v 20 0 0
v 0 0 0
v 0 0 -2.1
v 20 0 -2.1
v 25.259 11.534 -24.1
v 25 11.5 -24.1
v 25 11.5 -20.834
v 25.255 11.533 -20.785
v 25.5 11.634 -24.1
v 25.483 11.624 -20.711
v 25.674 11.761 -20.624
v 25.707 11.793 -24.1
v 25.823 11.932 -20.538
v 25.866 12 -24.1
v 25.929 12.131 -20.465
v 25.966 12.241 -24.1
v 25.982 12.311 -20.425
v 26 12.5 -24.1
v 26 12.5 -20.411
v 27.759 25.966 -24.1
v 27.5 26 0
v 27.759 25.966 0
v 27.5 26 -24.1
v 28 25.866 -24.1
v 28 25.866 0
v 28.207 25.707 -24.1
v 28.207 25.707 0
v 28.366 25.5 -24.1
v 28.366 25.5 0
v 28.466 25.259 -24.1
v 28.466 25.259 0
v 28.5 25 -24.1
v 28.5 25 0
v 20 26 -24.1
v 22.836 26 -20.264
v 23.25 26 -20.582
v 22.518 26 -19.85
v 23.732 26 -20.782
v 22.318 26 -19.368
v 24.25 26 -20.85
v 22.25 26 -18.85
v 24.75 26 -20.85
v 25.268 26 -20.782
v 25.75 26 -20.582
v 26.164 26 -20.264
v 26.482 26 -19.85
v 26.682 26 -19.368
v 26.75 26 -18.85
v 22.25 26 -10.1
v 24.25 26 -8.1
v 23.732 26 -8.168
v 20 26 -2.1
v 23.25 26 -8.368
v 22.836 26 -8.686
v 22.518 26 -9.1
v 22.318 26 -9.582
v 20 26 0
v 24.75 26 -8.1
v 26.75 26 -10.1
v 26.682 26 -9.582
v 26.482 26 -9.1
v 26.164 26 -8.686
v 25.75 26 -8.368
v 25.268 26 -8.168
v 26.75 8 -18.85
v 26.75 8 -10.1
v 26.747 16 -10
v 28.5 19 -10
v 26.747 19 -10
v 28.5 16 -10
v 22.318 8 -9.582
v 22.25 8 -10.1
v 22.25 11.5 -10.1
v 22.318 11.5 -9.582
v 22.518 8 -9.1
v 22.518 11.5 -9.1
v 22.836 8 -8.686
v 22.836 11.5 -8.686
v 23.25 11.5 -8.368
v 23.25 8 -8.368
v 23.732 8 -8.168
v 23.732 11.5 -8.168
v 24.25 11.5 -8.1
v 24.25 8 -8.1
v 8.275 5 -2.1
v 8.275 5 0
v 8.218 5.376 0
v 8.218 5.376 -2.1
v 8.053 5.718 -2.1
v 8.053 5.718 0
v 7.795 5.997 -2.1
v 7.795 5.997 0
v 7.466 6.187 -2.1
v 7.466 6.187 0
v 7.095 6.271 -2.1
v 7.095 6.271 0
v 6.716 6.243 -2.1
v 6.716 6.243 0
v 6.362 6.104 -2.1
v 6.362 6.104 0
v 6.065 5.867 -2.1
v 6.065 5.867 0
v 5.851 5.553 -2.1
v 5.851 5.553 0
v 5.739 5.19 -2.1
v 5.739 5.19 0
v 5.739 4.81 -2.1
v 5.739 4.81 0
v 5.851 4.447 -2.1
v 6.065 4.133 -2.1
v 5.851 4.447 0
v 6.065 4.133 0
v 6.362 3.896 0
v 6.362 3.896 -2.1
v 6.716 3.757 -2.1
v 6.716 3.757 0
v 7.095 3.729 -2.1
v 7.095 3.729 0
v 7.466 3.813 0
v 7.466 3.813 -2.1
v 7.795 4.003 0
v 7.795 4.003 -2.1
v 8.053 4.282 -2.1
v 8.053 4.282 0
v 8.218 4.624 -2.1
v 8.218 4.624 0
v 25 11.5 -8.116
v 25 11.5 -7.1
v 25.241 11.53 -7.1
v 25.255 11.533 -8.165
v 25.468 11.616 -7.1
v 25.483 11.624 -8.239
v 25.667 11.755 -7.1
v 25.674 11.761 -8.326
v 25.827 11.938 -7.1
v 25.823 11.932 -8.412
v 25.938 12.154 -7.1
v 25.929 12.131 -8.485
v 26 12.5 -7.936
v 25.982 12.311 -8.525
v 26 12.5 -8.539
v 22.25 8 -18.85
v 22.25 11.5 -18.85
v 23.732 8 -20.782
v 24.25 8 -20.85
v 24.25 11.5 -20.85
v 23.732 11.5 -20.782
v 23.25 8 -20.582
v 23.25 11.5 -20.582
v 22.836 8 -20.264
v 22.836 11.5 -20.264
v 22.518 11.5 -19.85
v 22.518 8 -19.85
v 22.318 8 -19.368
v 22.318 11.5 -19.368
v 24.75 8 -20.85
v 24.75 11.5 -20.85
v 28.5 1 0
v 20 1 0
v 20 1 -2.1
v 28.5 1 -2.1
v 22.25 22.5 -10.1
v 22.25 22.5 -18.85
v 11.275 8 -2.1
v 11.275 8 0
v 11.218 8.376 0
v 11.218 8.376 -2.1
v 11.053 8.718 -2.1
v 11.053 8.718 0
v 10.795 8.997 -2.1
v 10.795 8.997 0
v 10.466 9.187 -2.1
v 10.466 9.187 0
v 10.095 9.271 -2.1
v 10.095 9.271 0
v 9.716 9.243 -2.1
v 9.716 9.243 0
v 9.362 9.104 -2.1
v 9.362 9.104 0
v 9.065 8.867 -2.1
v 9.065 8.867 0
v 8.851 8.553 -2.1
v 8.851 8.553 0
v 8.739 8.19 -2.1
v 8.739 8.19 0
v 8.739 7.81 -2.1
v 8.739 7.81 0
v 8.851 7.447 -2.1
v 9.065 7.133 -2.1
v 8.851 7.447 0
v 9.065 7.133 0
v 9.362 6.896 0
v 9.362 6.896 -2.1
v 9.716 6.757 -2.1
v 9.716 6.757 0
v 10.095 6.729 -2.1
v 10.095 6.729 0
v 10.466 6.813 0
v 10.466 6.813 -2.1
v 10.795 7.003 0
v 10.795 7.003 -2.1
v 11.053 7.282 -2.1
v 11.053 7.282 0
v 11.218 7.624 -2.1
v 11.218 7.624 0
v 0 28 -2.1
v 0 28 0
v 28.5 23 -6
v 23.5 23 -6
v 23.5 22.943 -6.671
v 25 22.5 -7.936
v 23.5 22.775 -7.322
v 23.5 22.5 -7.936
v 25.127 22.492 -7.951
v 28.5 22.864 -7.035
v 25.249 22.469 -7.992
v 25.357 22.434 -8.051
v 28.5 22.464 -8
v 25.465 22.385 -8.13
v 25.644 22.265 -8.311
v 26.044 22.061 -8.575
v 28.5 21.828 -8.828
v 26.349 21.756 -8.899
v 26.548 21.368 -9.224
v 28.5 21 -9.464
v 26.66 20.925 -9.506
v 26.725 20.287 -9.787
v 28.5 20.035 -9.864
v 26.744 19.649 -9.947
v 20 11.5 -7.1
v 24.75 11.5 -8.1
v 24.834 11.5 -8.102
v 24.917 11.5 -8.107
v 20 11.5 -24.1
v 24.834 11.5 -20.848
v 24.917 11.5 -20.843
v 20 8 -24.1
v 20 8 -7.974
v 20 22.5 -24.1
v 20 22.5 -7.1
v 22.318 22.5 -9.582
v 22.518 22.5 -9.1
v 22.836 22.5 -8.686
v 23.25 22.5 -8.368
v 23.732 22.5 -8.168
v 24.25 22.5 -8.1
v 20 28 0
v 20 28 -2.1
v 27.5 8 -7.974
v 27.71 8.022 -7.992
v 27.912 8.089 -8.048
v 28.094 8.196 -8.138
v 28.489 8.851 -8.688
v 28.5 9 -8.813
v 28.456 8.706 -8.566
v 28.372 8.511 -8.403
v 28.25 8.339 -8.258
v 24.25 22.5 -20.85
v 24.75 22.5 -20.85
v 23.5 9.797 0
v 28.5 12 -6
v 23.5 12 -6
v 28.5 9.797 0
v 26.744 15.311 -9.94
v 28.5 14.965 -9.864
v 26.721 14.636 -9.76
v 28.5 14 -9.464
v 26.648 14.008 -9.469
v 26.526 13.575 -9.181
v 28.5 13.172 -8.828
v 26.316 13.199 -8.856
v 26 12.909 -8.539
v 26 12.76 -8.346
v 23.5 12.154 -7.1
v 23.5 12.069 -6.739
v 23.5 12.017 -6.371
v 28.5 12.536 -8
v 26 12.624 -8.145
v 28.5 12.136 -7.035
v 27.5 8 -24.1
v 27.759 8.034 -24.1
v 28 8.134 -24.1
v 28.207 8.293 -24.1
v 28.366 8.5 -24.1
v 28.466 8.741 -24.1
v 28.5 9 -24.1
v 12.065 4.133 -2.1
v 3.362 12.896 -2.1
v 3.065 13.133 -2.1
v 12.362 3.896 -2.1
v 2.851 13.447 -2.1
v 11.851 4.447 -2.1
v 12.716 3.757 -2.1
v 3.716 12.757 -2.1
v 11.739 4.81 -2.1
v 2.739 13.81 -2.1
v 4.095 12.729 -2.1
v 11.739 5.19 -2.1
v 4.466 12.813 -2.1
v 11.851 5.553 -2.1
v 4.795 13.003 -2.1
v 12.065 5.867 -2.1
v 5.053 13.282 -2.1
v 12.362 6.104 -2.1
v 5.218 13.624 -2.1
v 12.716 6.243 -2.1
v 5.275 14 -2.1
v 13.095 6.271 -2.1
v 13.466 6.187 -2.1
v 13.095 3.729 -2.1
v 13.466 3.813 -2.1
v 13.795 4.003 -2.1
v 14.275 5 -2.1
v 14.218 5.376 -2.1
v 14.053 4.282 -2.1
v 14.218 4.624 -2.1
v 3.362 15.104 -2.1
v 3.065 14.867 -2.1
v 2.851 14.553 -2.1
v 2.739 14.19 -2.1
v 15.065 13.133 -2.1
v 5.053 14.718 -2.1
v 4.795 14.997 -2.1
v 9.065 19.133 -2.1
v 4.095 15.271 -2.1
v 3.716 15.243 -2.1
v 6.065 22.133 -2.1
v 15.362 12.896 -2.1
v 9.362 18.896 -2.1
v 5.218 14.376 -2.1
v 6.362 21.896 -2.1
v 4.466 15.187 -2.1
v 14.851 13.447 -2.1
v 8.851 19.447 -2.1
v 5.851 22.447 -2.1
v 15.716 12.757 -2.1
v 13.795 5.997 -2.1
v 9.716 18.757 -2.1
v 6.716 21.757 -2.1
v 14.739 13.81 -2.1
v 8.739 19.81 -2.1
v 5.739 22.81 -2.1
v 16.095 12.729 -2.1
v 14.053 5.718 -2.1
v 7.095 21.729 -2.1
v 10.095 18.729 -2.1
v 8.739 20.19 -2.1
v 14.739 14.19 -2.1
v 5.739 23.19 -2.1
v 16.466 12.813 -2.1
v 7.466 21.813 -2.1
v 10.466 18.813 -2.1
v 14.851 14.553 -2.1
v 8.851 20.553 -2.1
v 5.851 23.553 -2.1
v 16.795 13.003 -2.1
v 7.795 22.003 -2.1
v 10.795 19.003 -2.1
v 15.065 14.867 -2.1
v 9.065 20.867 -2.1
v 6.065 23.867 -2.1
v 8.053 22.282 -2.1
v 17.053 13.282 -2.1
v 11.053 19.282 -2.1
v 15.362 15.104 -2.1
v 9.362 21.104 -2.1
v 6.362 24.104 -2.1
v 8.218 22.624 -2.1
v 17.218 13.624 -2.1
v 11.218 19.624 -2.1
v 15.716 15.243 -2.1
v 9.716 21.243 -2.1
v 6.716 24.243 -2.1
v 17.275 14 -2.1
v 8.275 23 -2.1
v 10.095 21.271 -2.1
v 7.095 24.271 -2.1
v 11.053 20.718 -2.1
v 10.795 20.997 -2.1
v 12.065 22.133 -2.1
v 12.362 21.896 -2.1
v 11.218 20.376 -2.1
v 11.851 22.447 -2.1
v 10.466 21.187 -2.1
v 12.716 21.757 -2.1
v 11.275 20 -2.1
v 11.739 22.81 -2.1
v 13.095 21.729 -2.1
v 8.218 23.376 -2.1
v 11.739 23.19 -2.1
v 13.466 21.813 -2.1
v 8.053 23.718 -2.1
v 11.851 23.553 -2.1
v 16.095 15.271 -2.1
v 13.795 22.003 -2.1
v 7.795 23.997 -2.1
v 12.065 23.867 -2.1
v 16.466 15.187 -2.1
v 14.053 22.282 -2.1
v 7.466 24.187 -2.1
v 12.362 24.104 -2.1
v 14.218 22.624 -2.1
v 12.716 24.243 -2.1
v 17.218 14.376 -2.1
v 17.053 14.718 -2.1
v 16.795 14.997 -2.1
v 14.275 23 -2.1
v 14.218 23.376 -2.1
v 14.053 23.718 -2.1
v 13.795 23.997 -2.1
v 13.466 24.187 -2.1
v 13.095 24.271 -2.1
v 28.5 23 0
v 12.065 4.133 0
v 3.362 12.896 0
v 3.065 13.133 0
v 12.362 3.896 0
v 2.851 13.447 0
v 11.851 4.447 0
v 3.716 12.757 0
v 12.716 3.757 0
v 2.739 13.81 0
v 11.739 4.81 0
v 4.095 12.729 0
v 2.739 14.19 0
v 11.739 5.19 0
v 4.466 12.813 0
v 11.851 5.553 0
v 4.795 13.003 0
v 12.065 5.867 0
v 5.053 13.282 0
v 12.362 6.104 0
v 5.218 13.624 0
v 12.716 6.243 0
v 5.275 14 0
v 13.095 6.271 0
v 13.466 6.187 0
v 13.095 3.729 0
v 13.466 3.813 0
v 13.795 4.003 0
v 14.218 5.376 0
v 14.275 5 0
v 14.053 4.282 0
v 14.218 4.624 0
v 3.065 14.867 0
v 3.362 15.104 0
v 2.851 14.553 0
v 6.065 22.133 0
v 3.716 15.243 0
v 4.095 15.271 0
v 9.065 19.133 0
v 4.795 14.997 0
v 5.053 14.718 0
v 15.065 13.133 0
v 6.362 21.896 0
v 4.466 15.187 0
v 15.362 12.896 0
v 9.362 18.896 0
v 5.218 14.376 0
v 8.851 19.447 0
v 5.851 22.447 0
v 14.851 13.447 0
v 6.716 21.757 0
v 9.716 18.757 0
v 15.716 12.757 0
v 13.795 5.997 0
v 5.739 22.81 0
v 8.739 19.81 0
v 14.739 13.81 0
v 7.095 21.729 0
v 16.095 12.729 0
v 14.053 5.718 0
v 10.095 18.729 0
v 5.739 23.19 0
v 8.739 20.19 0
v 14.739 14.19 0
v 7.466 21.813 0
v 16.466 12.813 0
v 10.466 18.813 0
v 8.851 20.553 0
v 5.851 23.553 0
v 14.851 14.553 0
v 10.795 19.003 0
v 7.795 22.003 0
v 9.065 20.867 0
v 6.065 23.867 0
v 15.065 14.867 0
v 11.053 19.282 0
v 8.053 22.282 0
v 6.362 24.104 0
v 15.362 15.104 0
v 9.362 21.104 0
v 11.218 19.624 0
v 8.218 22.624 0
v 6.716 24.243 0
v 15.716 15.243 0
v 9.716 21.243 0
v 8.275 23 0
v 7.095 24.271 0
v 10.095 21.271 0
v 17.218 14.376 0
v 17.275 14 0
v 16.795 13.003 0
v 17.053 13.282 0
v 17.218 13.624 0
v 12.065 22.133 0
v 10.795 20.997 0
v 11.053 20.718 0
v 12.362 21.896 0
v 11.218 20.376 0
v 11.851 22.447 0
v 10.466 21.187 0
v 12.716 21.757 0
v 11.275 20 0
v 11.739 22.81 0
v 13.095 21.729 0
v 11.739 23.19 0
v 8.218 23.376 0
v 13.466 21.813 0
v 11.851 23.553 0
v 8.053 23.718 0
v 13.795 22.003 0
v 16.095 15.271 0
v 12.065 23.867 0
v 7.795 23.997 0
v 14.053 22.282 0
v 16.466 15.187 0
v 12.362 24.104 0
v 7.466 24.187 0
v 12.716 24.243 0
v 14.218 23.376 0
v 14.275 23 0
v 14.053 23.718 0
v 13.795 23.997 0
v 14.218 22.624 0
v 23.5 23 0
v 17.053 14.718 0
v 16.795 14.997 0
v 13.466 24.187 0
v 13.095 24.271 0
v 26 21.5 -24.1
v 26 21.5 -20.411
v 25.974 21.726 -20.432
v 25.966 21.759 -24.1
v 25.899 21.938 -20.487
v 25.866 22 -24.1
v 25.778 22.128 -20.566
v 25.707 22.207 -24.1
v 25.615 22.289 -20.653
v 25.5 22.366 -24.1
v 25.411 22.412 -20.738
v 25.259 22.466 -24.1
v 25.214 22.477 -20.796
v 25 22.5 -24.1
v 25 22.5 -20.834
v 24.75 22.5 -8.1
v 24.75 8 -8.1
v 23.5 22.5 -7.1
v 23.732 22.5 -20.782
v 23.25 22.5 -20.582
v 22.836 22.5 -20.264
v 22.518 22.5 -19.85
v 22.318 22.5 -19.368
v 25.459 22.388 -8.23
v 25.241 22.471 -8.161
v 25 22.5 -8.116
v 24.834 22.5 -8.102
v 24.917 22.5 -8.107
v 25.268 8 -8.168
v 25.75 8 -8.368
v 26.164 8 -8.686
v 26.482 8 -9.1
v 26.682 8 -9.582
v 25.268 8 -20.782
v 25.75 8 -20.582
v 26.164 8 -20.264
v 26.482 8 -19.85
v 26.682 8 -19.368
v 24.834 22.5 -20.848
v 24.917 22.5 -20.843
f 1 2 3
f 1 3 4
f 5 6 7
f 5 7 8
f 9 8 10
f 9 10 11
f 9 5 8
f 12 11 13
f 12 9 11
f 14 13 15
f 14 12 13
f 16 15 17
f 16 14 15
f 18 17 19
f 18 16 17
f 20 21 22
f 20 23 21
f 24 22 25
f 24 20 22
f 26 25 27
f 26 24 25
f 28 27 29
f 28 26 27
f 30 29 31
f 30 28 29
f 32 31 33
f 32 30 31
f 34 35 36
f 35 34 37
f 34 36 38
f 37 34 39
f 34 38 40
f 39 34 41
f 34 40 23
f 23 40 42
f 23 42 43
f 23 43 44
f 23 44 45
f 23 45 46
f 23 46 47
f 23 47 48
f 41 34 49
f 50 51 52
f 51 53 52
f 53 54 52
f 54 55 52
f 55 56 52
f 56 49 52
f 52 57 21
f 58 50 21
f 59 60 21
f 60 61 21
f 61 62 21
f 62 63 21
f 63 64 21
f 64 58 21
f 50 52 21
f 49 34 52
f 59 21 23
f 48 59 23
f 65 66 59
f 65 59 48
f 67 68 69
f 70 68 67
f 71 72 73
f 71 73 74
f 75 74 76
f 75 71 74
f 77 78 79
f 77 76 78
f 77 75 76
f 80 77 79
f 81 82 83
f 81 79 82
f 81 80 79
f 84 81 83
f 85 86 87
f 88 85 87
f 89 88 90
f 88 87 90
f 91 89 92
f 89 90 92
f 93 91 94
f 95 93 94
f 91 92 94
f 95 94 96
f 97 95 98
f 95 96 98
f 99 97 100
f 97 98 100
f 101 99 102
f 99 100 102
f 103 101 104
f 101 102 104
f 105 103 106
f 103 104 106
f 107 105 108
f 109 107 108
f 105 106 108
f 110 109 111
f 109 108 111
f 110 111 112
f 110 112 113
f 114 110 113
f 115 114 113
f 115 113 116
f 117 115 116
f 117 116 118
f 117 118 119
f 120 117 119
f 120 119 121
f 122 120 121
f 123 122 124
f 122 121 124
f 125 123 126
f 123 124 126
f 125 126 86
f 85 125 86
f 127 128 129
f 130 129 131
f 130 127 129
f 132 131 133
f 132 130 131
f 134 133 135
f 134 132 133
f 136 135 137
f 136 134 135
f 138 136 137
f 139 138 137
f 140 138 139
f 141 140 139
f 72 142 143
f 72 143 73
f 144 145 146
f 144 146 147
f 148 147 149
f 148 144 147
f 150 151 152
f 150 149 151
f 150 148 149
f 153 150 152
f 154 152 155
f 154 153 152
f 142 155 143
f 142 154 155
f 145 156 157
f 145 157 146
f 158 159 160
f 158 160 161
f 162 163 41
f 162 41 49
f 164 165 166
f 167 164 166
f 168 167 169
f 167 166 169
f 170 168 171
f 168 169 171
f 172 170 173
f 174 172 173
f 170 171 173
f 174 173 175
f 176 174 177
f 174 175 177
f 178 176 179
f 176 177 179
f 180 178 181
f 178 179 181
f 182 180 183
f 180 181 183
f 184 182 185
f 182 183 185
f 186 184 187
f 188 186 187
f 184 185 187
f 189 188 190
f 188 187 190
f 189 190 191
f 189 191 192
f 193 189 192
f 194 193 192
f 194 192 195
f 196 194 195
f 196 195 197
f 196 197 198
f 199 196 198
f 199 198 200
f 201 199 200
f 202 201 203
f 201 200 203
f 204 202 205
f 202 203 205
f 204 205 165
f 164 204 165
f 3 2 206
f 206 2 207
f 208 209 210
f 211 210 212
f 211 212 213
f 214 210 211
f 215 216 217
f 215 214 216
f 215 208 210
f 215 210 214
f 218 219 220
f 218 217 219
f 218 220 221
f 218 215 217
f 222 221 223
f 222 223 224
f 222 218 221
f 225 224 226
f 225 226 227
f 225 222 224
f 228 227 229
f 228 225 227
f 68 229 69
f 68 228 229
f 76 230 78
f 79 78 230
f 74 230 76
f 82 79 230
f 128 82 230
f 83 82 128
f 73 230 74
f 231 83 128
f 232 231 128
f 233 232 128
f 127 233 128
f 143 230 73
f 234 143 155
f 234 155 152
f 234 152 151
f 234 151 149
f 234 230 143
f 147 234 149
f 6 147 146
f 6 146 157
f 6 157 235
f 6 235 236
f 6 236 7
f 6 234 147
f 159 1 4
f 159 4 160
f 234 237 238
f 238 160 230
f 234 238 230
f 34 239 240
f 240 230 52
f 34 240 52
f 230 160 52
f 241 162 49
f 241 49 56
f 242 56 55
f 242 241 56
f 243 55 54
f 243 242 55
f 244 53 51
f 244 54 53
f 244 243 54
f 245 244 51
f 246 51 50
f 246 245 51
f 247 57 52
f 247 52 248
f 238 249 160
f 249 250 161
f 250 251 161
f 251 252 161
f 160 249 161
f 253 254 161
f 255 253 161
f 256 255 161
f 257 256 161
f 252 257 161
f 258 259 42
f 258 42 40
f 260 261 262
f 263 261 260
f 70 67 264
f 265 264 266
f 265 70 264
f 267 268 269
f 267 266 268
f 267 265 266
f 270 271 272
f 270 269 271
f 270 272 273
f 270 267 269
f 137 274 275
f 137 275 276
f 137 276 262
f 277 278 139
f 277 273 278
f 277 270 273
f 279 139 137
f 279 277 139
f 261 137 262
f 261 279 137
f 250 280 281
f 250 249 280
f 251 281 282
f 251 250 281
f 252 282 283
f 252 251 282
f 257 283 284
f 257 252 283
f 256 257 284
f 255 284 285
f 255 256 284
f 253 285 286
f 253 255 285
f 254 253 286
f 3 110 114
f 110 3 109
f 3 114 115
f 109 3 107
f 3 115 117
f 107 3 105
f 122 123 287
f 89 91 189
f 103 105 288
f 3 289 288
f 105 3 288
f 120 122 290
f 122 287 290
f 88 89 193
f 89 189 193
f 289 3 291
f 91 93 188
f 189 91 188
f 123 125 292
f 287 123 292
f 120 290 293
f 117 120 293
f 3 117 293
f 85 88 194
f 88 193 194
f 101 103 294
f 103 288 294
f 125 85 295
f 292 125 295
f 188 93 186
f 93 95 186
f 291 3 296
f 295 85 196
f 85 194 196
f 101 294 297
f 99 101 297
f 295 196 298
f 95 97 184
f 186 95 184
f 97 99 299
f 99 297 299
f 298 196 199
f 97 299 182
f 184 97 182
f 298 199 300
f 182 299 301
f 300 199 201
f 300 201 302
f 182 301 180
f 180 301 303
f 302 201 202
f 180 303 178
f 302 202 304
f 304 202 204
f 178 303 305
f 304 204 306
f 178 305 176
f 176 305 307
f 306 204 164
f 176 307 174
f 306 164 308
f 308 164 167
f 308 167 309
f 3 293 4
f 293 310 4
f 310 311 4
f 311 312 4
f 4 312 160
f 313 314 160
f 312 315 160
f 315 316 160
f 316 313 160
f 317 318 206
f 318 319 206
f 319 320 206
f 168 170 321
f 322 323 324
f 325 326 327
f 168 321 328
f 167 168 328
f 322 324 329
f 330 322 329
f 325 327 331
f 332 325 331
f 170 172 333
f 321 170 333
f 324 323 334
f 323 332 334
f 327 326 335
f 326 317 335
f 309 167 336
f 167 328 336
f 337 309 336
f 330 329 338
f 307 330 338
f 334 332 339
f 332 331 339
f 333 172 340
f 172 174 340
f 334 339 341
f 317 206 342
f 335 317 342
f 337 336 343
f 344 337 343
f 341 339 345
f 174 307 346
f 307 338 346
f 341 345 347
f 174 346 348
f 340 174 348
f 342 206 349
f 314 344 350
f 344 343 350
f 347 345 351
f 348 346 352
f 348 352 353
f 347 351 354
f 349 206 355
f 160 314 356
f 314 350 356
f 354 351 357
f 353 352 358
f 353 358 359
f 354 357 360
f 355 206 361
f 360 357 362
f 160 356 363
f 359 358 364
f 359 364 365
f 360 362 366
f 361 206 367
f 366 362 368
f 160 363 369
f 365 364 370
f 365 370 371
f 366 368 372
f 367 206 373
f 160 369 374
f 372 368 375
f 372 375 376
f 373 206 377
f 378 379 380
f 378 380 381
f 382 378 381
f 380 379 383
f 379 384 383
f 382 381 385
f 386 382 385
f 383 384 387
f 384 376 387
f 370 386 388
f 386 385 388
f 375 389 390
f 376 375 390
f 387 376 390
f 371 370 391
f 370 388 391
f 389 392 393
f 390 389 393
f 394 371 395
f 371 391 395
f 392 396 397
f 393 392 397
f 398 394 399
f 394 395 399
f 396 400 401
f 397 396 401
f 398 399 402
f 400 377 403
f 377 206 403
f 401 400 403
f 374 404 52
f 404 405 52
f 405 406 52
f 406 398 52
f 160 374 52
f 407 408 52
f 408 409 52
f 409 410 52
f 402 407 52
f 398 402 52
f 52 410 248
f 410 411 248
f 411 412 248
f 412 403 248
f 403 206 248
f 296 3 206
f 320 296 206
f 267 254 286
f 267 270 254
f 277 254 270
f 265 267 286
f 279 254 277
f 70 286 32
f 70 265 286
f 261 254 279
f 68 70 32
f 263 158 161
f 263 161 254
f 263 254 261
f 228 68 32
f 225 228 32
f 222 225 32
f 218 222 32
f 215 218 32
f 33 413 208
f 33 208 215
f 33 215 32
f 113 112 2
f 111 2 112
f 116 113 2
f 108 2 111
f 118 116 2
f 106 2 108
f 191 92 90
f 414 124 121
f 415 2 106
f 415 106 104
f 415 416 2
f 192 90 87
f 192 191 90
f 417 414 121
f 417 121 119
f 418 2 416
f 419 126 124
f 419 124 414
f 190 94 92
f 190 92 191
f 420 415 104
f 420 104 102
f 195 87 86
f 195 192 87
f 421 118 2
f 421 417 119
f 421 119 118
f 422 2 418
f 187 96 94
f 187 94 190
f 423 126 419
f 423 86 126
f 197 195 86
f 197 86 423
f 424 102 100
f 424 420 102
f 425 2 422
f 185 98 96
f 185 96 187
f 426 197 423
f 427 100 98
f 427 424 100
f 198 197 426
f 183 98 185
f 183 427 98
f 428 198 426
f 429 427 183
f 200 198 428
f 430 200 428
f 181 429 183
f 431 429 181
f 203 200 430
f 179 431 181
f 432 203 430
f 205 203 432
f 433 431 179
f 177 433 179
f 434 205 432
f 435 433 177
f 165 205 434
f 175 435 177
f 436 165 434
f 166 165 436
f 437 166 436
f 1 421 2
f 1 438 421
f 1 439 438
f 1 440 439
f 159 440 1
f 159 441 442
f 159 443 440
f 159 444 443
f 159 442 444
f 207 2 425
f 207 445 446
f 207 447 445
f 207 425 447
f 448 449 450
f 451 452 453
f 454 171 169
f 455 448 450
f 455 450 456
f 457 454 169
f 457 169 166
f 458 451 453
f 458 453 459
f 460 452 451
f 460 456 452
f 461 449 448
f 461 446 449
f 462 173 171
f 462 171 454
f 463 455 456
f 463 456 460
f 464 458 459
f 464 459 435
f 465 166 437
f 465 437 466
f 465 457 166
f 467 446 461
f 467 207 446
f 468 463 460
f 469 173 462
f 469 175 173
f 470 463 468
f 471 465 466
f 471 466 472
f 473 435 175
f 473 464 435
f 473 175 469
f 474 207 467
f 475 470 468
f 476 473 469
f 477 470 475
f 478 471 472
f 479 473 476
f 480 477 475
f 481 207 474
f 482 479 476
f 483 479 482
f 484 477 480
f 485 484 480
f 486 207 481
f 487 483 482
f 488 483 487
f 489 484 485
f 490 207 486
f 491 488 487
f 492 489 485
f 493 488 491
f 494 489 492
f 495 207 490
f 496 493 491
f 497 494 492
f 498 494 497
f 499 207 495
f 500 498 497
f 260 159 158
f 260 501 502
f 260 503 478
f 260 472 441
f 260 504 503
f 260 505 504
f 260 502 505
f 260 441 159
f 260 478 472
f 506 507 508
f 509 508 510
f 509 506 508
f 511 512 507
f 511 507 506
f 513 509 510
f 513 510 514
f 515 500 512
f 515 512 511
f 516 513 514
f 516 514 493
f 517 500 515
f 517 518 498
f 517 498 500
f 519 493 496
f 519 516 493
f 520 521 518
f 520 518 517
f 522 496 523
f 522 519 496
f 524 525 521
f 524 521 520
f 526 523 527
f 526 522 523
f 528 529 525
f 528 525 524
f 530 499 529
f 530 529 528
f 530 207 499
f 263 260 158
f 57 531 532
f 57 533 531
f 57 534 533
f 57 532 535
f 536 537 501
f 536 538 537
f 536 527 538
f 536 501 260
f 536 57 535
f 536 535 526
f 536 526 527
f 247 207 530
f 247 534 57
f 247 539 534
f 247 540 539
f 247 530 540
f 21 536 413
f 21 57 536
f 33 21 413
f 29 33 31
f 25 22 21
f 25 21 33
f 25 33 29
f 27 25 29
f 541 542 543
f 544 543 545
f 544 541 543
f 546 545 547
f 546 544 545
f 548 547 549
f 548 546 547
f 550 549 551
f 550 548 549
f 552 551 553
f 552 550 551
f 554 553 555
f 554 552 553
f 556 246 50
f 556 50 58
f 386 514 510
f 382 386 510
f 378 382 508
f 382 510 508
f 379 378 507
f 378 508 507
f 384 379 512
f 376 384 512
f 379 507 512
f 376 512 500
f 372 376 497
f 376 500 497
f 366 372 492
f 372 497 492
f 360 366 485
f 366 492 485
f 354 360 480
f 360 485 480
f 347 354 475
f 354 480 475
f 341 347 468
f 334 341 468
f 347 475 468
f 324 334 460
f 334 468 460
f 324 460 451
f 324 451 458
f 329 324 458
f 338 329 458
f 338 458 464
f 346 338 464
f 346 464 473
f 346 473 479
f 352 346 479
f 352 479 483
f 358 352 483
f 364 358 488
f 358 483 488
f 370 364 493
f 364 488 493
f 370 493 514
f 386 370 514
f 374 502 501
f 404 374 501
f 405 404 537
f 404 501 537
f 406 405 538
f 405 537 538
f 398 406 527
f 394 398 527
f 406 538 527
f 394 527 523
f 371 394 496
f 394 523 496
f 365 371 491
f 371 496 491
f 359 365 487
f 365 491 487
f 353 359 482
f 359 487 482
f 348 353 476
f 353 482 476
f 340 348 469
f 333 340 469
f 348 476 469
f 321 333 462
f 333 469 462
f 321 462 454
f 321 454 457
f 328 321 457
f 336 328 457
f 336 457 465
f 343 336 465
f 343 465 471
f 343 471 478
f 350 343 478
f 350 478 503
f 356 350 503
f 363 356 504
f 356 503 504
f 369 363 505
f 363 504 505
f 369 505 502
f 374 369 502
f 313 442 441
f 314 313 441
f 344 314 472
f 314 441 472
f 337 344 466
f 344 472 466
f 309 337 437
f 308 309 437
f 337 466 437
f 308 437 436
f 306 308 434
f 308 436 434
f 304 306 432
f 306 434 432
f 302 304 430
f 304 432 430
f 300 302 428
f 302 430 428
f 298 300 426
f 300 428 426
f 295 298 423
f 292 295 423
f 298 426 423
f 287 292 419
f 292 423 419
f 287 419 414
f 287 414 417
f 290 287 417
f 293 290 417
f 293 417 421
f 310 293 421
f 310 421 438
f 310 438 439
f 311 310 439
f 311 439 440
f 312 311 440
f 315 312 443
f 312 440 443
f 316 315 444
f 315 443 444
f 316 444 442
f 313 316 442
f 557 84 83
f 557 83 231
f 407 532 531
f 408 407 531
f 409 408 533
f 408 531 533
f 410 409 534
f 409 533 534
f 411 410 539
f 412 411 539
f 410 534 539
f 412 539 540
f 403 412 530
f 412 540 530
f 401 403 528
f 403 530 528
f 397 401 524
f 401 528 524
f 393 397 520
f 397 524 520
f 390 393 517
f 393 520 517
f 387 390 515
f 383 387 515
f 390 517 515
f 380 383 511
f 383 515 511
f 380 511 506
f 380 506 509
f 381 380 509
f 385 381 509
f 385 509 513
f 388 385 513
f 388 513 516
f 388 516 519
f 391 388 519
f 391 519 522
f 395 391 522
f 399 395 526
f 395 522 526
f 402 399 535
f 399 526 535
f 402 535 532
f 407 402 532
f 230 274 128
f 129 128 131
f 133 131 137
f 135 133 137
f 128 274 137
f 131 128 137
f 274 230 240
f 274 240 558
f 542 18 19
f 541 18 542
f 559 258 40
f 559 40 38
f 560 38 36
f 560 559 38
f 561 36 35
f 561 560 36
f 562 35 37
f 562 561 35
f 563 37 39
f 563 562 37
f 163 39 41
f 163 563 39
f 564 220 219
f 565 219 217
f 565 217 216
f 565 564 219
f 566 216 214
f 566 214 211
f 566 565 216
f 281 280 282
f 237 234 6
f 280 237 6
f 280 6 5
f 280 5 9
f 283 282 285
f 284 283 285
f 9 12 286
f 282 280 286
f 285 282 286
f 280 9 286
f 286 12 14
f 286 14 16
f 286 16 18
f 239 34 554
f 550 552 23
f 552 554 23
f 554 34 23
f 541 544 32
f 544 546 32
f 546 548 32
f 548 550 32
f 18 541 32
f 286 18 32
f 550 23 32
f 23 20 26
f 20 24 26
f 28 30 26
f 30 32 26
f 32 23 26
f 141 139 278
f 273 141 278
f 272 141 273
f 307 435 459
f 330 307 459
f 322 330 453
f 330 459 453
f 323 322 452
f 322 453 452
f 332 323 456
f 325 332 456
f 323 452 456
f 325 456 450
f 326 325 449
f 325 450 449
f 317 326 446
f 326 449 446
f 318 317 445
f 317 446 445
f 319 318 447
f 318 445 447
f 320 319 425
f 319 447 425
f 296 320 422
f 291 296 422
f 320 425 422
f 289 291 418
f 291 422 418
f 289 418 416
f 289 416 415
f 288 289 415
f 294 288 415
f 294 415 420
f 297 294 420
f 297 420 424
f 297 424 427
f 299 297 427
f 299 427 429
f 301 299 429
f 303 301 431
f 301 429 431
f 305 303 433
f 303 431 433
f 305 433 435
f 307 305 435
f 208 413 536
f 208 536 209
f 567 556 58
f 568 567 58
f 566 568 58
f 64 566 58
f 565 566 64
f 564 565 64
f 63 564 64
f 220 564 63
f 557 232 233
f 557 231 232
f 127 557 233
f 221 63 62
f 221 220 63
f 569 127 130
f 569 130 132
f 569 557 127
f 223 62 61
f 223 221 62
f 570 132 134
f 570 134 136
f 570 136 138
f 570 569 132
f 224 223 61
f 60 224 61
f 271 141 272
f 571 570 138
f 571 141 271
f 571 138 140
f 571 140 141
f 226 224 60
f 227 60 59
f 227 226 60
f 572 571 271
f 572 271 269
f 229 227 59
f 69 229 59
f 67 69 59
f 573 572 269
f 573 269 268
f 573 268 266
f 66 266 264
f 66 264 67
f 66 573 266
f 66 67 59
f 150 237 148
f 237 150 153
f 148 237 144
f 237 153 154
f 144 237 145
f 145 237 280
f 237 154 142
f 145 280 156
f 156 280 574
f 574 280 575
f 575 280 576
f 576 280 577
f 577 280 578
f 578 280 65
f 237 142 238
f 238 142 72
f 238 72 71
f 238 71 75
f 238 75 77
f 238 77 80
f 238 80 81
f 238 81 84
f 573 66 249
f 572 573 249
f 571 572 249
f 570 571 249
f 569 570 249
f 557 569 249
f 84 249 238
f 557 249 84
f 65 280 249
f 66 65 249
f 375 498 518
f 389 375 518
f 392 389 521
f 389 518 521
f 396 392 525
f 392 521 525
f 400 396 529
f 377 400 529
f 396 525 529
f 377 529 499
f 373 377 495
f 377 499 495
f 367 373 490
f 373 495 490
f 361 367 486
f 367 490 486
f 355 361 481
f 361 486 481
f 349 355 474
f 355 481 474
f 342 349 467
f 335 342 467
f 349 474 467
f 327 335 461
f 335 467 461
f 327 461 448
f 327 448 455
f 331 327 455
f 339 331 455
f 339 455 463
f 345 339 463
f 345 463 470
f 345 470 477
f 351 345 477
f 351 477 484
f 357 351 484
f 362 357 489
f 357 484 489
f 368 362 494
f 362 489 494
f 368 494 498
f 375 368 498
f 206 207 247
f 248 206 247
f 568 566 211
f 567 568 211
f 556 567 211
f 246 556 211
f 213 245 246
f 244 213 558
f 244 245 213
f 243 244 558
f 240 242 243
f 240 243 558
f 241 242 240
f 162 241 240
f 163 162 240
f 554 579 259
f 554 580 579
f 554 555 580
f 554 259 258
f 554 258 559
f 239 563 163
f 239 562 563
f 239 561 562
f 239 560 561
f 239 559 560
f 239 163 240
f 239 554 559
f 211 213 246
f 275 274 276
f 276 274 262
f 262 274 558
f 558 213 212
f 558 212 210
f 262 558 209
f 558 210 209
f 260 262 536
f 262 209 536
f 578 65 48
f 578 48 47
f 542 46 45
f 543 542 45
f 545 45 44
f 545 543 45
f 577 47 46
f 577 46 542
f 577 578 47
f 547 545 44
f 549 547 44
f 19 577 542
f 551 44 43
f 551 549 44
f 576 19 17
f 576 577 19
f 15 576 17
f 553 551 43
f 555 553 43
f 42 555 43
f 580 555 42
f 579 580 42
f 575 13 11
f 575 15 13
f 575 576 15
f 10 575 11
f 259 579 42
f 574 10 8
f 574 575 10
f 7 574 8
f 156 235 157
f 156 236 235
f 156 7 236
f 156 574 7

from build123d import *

# Parameters (mm, degrees)
SKETCH1_R               = 1.275
BOSS_EXTRUDE1_DEPTH     = 2.1
SKETCH1_3_W             = 8.5
SKETCH1_3_H             = 25
BOSS_EXTRUDE2_DEPTH     = 24.1
CUT_EXTRUDE1_DEPTH      = 5
CUT_EXTRUDE2_DEPTH      = 46.486921197
CUT_EXTRUDE2_DEPTH_BACK = 46.486921197
CUT_EXTRUDE3_DEPTH      = 17
CUT_EXTRUDE4_REACH      = 48.659
FILLET1_R               = 1


with BuildPart() as part:
    # Sketch1 → Boss-Extrude1 (new body)
    with BuildSketch(Plane.XY):
        Polygon((0, 28), (0, 0), (20, 0), (20, 1), (20, 26), (20, 28), align=None)
        with Locations((7, 5)):
            Circle(SKETCH1_R, mode=Mode.SUBTRACT)
        with Locations((13, 5)):
            Circle(SKETCH1_R, mode=Mode.SUBTRACT)
        with Locations((10, 8)):
            Circle(SKETCH1_R, mode=Mode.SUBTRACT)
        with Locations((4, 14)):
            Circle(SKETCH1_R, mode=Mode.SUBTRACT)
        with Locations((10, 20)):
            Circle(SKETCH1_R, mode=Mode.SUBTRACT)
        with Locations((7, 23)):
            Circle(SKETCH1_R, mode=Mode.SUBTRACT)
        with Locations((13, 23)):
            Circle(SKETCH1_R, mode=Mode.SUBTRACT)
        with Locations((16, 14)):
            Circle(SKETCH1_R, mode=Mode.SUBTRACT)
    extrude(amount=-BOSS_EXTRUDE1_DEPTH)

    # Sketch1<3> → Boss-Extrude2 (add)
    with BuildSketch(Plane.XY):
        with Locations((24.25, 13.5)):
            Rectangle(SKETCH1_3_W, SKETCH1_3_H)
    extrude(amount=-BOSS_EXTRUDE2_DEPTH)

    # Sketch2 → Cut-Extrude1 (cut)
    with BuildSketch(Plane(origin=(28.5, 0, 0), x_dir=(0, 0, -1), z_dir=(1, 0, 0))):
        with BuildLine():
            Line((0, 23), (6, 23))
            ThreePointArc((6, 23), (8.828427125, 21.828427125), (10, 19))
            Line((10, 19), (10, 16))
            ThreePointArc((10, 16), (8.828427125, 13.171572875), (6, 12))
            Line((6, 12), (0, 9.797))
            Line((0, 9.797), (0, 23))
        make_face()
    extrude(amount=-CUT_EXTRUDE1_DEPTH, mode=Mode.SUBTRACT)

    # Sketch3 → Cut-Extrude2 (cut, two sides: drawn at the far end of the back side and taken through both)
    with BuildSketch(Plane(origin=(0, 26, 0), x_dir=(1, 0, 0), z_dir=(0, 1, 0)).offset(-CUT_EXTRUDE2_DEPTH_BACK)):
        with BuildLine():
            Line((24.75, 20.85), (24.25, 20.85))
            ThreePointArc((24.25, 20.85), (22.835786438, 20.264213562), (22.25, 18.85))
            Line((22.25, 18.85), (22.25, 10.1))
            ThreePointArc((22.25, 10.1), (22.835786438, 8.685786438), (24.25, 8.1))
            Line((24.25, 8.1), (24.75, 8.1))
            ThreePointArc((24.75, 8.1), (26.164213562, 8.685786438), (26.75, 10.1))
            Line((26.75, 10.1), (26.75, 18.85))
            ThreePointArc((26.75, 18.85), (26.164213562, 20.264213562), (24.75, 20.85))
        make_face()
    extrude(amount=CUT_EXTRUDE2_DEPTH + CUT_EXTRUDE2_DEPTH_BACK, mode=Mode.SUBTRACT)

    # Sketch4 → Cut-Extrude3 (cut)
    with BuildSketch(Plane(origin=(0, 0, -24.1), x_dir=(-1, 0, 0), z_dir=(0, 0, -1))):
        with BuildLine():
            Line((-20, 11.5), (-25, 11.5))
            ThreePointArc((-25, 11.5), (-25.707106781, 11.792893219), (-26, 12.5))
            Line((-26, 12.5), (-26, 21.5))
            ThreePointArc((-26, 21.5), (-25.707106781, 22.207106781), (-25, 22.5))
            Line((-25, 22.5), (-20, 22.5))
            Line((-20, 22.5), (-20, 11.5))
        make_face()
    extrude(amount=-CUT_EXTRUDE3_DEPTH, mode=Mode.SUBTRACT)

    # Sketch6 → Cut-Extrude4 (cut, up to next)
    with BuildSketch(Plane(origin=(28.5, 0, 0), x_dir=(0, 0, -1), z_dir=(1, 0, 0)), mode=Mode.PRIVATE) as cut_extrude4_sk1:
        Polygon((2.1, 1), (24.1, 1), (24.1, 8), (7.973697418, 8), align=None)
    cut_extrude4_tool1 = extrude(cut_extrude4_sk1.sketch, amount=-CUT_EXTRUDE4_REACH, mode=Mode.PRIVATE) & part.part
    add(cut_extrude4_tool1.solids().sort_by_distance((28.5, 4.320265, -14.493016))[0], mode=Mode.SUBTRACT)

    # Fillet1
    fillet1_edges = [part.edges().sort_by_distance(p)[0] for p in [
        (28.5, 8, -16.036848709),
        (28.5, 26, -12.05),
    ]]
    fillet(fillet1_edges, radius=FILLET1_R)


solid = part.part
